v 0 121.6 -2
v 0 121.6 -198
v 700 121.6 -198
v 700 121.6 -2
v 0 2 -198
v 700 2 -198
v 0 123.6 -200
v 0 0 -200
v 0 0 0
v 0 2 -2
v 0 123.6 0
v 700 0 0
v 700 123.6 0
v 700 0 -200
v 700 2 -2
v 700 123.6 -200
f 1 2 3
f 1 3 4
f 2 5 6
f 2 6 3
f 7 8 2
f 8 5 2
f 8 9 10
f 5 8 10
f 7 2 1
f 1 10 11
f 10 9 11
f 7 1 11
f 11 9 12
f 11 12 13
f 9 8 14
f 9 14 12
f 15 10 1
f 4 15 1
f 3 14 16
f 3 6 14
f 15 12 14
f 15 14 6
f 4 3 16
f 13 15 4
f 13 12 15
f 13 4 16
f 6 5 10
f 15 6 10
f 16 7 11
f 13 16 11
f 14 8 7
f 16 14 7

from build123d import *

# Parameters (mm, degrees)
SKETCH_W   = 123.6
SKETCH_H   = 200
SKETCH_W_2 = 119.6
SKETCH_H_2 = 196
PAD_DEPTH  = 700


with BuildPart() as part:
    # Sketch → Pad (new body)
    with BuildSketch(Plane.YZ):
        with Locations((61.8, -100)):
            Rectangle(SKETCH_W, SKETCH_H)
        with Locations((61.8, -100)):
            Rectangle(SKETCH_W_2, SKETCH_H_2, mode=Mode.SUBTRACT)
    extrude(amount=PAD_DEPTH)


solid = part.part
